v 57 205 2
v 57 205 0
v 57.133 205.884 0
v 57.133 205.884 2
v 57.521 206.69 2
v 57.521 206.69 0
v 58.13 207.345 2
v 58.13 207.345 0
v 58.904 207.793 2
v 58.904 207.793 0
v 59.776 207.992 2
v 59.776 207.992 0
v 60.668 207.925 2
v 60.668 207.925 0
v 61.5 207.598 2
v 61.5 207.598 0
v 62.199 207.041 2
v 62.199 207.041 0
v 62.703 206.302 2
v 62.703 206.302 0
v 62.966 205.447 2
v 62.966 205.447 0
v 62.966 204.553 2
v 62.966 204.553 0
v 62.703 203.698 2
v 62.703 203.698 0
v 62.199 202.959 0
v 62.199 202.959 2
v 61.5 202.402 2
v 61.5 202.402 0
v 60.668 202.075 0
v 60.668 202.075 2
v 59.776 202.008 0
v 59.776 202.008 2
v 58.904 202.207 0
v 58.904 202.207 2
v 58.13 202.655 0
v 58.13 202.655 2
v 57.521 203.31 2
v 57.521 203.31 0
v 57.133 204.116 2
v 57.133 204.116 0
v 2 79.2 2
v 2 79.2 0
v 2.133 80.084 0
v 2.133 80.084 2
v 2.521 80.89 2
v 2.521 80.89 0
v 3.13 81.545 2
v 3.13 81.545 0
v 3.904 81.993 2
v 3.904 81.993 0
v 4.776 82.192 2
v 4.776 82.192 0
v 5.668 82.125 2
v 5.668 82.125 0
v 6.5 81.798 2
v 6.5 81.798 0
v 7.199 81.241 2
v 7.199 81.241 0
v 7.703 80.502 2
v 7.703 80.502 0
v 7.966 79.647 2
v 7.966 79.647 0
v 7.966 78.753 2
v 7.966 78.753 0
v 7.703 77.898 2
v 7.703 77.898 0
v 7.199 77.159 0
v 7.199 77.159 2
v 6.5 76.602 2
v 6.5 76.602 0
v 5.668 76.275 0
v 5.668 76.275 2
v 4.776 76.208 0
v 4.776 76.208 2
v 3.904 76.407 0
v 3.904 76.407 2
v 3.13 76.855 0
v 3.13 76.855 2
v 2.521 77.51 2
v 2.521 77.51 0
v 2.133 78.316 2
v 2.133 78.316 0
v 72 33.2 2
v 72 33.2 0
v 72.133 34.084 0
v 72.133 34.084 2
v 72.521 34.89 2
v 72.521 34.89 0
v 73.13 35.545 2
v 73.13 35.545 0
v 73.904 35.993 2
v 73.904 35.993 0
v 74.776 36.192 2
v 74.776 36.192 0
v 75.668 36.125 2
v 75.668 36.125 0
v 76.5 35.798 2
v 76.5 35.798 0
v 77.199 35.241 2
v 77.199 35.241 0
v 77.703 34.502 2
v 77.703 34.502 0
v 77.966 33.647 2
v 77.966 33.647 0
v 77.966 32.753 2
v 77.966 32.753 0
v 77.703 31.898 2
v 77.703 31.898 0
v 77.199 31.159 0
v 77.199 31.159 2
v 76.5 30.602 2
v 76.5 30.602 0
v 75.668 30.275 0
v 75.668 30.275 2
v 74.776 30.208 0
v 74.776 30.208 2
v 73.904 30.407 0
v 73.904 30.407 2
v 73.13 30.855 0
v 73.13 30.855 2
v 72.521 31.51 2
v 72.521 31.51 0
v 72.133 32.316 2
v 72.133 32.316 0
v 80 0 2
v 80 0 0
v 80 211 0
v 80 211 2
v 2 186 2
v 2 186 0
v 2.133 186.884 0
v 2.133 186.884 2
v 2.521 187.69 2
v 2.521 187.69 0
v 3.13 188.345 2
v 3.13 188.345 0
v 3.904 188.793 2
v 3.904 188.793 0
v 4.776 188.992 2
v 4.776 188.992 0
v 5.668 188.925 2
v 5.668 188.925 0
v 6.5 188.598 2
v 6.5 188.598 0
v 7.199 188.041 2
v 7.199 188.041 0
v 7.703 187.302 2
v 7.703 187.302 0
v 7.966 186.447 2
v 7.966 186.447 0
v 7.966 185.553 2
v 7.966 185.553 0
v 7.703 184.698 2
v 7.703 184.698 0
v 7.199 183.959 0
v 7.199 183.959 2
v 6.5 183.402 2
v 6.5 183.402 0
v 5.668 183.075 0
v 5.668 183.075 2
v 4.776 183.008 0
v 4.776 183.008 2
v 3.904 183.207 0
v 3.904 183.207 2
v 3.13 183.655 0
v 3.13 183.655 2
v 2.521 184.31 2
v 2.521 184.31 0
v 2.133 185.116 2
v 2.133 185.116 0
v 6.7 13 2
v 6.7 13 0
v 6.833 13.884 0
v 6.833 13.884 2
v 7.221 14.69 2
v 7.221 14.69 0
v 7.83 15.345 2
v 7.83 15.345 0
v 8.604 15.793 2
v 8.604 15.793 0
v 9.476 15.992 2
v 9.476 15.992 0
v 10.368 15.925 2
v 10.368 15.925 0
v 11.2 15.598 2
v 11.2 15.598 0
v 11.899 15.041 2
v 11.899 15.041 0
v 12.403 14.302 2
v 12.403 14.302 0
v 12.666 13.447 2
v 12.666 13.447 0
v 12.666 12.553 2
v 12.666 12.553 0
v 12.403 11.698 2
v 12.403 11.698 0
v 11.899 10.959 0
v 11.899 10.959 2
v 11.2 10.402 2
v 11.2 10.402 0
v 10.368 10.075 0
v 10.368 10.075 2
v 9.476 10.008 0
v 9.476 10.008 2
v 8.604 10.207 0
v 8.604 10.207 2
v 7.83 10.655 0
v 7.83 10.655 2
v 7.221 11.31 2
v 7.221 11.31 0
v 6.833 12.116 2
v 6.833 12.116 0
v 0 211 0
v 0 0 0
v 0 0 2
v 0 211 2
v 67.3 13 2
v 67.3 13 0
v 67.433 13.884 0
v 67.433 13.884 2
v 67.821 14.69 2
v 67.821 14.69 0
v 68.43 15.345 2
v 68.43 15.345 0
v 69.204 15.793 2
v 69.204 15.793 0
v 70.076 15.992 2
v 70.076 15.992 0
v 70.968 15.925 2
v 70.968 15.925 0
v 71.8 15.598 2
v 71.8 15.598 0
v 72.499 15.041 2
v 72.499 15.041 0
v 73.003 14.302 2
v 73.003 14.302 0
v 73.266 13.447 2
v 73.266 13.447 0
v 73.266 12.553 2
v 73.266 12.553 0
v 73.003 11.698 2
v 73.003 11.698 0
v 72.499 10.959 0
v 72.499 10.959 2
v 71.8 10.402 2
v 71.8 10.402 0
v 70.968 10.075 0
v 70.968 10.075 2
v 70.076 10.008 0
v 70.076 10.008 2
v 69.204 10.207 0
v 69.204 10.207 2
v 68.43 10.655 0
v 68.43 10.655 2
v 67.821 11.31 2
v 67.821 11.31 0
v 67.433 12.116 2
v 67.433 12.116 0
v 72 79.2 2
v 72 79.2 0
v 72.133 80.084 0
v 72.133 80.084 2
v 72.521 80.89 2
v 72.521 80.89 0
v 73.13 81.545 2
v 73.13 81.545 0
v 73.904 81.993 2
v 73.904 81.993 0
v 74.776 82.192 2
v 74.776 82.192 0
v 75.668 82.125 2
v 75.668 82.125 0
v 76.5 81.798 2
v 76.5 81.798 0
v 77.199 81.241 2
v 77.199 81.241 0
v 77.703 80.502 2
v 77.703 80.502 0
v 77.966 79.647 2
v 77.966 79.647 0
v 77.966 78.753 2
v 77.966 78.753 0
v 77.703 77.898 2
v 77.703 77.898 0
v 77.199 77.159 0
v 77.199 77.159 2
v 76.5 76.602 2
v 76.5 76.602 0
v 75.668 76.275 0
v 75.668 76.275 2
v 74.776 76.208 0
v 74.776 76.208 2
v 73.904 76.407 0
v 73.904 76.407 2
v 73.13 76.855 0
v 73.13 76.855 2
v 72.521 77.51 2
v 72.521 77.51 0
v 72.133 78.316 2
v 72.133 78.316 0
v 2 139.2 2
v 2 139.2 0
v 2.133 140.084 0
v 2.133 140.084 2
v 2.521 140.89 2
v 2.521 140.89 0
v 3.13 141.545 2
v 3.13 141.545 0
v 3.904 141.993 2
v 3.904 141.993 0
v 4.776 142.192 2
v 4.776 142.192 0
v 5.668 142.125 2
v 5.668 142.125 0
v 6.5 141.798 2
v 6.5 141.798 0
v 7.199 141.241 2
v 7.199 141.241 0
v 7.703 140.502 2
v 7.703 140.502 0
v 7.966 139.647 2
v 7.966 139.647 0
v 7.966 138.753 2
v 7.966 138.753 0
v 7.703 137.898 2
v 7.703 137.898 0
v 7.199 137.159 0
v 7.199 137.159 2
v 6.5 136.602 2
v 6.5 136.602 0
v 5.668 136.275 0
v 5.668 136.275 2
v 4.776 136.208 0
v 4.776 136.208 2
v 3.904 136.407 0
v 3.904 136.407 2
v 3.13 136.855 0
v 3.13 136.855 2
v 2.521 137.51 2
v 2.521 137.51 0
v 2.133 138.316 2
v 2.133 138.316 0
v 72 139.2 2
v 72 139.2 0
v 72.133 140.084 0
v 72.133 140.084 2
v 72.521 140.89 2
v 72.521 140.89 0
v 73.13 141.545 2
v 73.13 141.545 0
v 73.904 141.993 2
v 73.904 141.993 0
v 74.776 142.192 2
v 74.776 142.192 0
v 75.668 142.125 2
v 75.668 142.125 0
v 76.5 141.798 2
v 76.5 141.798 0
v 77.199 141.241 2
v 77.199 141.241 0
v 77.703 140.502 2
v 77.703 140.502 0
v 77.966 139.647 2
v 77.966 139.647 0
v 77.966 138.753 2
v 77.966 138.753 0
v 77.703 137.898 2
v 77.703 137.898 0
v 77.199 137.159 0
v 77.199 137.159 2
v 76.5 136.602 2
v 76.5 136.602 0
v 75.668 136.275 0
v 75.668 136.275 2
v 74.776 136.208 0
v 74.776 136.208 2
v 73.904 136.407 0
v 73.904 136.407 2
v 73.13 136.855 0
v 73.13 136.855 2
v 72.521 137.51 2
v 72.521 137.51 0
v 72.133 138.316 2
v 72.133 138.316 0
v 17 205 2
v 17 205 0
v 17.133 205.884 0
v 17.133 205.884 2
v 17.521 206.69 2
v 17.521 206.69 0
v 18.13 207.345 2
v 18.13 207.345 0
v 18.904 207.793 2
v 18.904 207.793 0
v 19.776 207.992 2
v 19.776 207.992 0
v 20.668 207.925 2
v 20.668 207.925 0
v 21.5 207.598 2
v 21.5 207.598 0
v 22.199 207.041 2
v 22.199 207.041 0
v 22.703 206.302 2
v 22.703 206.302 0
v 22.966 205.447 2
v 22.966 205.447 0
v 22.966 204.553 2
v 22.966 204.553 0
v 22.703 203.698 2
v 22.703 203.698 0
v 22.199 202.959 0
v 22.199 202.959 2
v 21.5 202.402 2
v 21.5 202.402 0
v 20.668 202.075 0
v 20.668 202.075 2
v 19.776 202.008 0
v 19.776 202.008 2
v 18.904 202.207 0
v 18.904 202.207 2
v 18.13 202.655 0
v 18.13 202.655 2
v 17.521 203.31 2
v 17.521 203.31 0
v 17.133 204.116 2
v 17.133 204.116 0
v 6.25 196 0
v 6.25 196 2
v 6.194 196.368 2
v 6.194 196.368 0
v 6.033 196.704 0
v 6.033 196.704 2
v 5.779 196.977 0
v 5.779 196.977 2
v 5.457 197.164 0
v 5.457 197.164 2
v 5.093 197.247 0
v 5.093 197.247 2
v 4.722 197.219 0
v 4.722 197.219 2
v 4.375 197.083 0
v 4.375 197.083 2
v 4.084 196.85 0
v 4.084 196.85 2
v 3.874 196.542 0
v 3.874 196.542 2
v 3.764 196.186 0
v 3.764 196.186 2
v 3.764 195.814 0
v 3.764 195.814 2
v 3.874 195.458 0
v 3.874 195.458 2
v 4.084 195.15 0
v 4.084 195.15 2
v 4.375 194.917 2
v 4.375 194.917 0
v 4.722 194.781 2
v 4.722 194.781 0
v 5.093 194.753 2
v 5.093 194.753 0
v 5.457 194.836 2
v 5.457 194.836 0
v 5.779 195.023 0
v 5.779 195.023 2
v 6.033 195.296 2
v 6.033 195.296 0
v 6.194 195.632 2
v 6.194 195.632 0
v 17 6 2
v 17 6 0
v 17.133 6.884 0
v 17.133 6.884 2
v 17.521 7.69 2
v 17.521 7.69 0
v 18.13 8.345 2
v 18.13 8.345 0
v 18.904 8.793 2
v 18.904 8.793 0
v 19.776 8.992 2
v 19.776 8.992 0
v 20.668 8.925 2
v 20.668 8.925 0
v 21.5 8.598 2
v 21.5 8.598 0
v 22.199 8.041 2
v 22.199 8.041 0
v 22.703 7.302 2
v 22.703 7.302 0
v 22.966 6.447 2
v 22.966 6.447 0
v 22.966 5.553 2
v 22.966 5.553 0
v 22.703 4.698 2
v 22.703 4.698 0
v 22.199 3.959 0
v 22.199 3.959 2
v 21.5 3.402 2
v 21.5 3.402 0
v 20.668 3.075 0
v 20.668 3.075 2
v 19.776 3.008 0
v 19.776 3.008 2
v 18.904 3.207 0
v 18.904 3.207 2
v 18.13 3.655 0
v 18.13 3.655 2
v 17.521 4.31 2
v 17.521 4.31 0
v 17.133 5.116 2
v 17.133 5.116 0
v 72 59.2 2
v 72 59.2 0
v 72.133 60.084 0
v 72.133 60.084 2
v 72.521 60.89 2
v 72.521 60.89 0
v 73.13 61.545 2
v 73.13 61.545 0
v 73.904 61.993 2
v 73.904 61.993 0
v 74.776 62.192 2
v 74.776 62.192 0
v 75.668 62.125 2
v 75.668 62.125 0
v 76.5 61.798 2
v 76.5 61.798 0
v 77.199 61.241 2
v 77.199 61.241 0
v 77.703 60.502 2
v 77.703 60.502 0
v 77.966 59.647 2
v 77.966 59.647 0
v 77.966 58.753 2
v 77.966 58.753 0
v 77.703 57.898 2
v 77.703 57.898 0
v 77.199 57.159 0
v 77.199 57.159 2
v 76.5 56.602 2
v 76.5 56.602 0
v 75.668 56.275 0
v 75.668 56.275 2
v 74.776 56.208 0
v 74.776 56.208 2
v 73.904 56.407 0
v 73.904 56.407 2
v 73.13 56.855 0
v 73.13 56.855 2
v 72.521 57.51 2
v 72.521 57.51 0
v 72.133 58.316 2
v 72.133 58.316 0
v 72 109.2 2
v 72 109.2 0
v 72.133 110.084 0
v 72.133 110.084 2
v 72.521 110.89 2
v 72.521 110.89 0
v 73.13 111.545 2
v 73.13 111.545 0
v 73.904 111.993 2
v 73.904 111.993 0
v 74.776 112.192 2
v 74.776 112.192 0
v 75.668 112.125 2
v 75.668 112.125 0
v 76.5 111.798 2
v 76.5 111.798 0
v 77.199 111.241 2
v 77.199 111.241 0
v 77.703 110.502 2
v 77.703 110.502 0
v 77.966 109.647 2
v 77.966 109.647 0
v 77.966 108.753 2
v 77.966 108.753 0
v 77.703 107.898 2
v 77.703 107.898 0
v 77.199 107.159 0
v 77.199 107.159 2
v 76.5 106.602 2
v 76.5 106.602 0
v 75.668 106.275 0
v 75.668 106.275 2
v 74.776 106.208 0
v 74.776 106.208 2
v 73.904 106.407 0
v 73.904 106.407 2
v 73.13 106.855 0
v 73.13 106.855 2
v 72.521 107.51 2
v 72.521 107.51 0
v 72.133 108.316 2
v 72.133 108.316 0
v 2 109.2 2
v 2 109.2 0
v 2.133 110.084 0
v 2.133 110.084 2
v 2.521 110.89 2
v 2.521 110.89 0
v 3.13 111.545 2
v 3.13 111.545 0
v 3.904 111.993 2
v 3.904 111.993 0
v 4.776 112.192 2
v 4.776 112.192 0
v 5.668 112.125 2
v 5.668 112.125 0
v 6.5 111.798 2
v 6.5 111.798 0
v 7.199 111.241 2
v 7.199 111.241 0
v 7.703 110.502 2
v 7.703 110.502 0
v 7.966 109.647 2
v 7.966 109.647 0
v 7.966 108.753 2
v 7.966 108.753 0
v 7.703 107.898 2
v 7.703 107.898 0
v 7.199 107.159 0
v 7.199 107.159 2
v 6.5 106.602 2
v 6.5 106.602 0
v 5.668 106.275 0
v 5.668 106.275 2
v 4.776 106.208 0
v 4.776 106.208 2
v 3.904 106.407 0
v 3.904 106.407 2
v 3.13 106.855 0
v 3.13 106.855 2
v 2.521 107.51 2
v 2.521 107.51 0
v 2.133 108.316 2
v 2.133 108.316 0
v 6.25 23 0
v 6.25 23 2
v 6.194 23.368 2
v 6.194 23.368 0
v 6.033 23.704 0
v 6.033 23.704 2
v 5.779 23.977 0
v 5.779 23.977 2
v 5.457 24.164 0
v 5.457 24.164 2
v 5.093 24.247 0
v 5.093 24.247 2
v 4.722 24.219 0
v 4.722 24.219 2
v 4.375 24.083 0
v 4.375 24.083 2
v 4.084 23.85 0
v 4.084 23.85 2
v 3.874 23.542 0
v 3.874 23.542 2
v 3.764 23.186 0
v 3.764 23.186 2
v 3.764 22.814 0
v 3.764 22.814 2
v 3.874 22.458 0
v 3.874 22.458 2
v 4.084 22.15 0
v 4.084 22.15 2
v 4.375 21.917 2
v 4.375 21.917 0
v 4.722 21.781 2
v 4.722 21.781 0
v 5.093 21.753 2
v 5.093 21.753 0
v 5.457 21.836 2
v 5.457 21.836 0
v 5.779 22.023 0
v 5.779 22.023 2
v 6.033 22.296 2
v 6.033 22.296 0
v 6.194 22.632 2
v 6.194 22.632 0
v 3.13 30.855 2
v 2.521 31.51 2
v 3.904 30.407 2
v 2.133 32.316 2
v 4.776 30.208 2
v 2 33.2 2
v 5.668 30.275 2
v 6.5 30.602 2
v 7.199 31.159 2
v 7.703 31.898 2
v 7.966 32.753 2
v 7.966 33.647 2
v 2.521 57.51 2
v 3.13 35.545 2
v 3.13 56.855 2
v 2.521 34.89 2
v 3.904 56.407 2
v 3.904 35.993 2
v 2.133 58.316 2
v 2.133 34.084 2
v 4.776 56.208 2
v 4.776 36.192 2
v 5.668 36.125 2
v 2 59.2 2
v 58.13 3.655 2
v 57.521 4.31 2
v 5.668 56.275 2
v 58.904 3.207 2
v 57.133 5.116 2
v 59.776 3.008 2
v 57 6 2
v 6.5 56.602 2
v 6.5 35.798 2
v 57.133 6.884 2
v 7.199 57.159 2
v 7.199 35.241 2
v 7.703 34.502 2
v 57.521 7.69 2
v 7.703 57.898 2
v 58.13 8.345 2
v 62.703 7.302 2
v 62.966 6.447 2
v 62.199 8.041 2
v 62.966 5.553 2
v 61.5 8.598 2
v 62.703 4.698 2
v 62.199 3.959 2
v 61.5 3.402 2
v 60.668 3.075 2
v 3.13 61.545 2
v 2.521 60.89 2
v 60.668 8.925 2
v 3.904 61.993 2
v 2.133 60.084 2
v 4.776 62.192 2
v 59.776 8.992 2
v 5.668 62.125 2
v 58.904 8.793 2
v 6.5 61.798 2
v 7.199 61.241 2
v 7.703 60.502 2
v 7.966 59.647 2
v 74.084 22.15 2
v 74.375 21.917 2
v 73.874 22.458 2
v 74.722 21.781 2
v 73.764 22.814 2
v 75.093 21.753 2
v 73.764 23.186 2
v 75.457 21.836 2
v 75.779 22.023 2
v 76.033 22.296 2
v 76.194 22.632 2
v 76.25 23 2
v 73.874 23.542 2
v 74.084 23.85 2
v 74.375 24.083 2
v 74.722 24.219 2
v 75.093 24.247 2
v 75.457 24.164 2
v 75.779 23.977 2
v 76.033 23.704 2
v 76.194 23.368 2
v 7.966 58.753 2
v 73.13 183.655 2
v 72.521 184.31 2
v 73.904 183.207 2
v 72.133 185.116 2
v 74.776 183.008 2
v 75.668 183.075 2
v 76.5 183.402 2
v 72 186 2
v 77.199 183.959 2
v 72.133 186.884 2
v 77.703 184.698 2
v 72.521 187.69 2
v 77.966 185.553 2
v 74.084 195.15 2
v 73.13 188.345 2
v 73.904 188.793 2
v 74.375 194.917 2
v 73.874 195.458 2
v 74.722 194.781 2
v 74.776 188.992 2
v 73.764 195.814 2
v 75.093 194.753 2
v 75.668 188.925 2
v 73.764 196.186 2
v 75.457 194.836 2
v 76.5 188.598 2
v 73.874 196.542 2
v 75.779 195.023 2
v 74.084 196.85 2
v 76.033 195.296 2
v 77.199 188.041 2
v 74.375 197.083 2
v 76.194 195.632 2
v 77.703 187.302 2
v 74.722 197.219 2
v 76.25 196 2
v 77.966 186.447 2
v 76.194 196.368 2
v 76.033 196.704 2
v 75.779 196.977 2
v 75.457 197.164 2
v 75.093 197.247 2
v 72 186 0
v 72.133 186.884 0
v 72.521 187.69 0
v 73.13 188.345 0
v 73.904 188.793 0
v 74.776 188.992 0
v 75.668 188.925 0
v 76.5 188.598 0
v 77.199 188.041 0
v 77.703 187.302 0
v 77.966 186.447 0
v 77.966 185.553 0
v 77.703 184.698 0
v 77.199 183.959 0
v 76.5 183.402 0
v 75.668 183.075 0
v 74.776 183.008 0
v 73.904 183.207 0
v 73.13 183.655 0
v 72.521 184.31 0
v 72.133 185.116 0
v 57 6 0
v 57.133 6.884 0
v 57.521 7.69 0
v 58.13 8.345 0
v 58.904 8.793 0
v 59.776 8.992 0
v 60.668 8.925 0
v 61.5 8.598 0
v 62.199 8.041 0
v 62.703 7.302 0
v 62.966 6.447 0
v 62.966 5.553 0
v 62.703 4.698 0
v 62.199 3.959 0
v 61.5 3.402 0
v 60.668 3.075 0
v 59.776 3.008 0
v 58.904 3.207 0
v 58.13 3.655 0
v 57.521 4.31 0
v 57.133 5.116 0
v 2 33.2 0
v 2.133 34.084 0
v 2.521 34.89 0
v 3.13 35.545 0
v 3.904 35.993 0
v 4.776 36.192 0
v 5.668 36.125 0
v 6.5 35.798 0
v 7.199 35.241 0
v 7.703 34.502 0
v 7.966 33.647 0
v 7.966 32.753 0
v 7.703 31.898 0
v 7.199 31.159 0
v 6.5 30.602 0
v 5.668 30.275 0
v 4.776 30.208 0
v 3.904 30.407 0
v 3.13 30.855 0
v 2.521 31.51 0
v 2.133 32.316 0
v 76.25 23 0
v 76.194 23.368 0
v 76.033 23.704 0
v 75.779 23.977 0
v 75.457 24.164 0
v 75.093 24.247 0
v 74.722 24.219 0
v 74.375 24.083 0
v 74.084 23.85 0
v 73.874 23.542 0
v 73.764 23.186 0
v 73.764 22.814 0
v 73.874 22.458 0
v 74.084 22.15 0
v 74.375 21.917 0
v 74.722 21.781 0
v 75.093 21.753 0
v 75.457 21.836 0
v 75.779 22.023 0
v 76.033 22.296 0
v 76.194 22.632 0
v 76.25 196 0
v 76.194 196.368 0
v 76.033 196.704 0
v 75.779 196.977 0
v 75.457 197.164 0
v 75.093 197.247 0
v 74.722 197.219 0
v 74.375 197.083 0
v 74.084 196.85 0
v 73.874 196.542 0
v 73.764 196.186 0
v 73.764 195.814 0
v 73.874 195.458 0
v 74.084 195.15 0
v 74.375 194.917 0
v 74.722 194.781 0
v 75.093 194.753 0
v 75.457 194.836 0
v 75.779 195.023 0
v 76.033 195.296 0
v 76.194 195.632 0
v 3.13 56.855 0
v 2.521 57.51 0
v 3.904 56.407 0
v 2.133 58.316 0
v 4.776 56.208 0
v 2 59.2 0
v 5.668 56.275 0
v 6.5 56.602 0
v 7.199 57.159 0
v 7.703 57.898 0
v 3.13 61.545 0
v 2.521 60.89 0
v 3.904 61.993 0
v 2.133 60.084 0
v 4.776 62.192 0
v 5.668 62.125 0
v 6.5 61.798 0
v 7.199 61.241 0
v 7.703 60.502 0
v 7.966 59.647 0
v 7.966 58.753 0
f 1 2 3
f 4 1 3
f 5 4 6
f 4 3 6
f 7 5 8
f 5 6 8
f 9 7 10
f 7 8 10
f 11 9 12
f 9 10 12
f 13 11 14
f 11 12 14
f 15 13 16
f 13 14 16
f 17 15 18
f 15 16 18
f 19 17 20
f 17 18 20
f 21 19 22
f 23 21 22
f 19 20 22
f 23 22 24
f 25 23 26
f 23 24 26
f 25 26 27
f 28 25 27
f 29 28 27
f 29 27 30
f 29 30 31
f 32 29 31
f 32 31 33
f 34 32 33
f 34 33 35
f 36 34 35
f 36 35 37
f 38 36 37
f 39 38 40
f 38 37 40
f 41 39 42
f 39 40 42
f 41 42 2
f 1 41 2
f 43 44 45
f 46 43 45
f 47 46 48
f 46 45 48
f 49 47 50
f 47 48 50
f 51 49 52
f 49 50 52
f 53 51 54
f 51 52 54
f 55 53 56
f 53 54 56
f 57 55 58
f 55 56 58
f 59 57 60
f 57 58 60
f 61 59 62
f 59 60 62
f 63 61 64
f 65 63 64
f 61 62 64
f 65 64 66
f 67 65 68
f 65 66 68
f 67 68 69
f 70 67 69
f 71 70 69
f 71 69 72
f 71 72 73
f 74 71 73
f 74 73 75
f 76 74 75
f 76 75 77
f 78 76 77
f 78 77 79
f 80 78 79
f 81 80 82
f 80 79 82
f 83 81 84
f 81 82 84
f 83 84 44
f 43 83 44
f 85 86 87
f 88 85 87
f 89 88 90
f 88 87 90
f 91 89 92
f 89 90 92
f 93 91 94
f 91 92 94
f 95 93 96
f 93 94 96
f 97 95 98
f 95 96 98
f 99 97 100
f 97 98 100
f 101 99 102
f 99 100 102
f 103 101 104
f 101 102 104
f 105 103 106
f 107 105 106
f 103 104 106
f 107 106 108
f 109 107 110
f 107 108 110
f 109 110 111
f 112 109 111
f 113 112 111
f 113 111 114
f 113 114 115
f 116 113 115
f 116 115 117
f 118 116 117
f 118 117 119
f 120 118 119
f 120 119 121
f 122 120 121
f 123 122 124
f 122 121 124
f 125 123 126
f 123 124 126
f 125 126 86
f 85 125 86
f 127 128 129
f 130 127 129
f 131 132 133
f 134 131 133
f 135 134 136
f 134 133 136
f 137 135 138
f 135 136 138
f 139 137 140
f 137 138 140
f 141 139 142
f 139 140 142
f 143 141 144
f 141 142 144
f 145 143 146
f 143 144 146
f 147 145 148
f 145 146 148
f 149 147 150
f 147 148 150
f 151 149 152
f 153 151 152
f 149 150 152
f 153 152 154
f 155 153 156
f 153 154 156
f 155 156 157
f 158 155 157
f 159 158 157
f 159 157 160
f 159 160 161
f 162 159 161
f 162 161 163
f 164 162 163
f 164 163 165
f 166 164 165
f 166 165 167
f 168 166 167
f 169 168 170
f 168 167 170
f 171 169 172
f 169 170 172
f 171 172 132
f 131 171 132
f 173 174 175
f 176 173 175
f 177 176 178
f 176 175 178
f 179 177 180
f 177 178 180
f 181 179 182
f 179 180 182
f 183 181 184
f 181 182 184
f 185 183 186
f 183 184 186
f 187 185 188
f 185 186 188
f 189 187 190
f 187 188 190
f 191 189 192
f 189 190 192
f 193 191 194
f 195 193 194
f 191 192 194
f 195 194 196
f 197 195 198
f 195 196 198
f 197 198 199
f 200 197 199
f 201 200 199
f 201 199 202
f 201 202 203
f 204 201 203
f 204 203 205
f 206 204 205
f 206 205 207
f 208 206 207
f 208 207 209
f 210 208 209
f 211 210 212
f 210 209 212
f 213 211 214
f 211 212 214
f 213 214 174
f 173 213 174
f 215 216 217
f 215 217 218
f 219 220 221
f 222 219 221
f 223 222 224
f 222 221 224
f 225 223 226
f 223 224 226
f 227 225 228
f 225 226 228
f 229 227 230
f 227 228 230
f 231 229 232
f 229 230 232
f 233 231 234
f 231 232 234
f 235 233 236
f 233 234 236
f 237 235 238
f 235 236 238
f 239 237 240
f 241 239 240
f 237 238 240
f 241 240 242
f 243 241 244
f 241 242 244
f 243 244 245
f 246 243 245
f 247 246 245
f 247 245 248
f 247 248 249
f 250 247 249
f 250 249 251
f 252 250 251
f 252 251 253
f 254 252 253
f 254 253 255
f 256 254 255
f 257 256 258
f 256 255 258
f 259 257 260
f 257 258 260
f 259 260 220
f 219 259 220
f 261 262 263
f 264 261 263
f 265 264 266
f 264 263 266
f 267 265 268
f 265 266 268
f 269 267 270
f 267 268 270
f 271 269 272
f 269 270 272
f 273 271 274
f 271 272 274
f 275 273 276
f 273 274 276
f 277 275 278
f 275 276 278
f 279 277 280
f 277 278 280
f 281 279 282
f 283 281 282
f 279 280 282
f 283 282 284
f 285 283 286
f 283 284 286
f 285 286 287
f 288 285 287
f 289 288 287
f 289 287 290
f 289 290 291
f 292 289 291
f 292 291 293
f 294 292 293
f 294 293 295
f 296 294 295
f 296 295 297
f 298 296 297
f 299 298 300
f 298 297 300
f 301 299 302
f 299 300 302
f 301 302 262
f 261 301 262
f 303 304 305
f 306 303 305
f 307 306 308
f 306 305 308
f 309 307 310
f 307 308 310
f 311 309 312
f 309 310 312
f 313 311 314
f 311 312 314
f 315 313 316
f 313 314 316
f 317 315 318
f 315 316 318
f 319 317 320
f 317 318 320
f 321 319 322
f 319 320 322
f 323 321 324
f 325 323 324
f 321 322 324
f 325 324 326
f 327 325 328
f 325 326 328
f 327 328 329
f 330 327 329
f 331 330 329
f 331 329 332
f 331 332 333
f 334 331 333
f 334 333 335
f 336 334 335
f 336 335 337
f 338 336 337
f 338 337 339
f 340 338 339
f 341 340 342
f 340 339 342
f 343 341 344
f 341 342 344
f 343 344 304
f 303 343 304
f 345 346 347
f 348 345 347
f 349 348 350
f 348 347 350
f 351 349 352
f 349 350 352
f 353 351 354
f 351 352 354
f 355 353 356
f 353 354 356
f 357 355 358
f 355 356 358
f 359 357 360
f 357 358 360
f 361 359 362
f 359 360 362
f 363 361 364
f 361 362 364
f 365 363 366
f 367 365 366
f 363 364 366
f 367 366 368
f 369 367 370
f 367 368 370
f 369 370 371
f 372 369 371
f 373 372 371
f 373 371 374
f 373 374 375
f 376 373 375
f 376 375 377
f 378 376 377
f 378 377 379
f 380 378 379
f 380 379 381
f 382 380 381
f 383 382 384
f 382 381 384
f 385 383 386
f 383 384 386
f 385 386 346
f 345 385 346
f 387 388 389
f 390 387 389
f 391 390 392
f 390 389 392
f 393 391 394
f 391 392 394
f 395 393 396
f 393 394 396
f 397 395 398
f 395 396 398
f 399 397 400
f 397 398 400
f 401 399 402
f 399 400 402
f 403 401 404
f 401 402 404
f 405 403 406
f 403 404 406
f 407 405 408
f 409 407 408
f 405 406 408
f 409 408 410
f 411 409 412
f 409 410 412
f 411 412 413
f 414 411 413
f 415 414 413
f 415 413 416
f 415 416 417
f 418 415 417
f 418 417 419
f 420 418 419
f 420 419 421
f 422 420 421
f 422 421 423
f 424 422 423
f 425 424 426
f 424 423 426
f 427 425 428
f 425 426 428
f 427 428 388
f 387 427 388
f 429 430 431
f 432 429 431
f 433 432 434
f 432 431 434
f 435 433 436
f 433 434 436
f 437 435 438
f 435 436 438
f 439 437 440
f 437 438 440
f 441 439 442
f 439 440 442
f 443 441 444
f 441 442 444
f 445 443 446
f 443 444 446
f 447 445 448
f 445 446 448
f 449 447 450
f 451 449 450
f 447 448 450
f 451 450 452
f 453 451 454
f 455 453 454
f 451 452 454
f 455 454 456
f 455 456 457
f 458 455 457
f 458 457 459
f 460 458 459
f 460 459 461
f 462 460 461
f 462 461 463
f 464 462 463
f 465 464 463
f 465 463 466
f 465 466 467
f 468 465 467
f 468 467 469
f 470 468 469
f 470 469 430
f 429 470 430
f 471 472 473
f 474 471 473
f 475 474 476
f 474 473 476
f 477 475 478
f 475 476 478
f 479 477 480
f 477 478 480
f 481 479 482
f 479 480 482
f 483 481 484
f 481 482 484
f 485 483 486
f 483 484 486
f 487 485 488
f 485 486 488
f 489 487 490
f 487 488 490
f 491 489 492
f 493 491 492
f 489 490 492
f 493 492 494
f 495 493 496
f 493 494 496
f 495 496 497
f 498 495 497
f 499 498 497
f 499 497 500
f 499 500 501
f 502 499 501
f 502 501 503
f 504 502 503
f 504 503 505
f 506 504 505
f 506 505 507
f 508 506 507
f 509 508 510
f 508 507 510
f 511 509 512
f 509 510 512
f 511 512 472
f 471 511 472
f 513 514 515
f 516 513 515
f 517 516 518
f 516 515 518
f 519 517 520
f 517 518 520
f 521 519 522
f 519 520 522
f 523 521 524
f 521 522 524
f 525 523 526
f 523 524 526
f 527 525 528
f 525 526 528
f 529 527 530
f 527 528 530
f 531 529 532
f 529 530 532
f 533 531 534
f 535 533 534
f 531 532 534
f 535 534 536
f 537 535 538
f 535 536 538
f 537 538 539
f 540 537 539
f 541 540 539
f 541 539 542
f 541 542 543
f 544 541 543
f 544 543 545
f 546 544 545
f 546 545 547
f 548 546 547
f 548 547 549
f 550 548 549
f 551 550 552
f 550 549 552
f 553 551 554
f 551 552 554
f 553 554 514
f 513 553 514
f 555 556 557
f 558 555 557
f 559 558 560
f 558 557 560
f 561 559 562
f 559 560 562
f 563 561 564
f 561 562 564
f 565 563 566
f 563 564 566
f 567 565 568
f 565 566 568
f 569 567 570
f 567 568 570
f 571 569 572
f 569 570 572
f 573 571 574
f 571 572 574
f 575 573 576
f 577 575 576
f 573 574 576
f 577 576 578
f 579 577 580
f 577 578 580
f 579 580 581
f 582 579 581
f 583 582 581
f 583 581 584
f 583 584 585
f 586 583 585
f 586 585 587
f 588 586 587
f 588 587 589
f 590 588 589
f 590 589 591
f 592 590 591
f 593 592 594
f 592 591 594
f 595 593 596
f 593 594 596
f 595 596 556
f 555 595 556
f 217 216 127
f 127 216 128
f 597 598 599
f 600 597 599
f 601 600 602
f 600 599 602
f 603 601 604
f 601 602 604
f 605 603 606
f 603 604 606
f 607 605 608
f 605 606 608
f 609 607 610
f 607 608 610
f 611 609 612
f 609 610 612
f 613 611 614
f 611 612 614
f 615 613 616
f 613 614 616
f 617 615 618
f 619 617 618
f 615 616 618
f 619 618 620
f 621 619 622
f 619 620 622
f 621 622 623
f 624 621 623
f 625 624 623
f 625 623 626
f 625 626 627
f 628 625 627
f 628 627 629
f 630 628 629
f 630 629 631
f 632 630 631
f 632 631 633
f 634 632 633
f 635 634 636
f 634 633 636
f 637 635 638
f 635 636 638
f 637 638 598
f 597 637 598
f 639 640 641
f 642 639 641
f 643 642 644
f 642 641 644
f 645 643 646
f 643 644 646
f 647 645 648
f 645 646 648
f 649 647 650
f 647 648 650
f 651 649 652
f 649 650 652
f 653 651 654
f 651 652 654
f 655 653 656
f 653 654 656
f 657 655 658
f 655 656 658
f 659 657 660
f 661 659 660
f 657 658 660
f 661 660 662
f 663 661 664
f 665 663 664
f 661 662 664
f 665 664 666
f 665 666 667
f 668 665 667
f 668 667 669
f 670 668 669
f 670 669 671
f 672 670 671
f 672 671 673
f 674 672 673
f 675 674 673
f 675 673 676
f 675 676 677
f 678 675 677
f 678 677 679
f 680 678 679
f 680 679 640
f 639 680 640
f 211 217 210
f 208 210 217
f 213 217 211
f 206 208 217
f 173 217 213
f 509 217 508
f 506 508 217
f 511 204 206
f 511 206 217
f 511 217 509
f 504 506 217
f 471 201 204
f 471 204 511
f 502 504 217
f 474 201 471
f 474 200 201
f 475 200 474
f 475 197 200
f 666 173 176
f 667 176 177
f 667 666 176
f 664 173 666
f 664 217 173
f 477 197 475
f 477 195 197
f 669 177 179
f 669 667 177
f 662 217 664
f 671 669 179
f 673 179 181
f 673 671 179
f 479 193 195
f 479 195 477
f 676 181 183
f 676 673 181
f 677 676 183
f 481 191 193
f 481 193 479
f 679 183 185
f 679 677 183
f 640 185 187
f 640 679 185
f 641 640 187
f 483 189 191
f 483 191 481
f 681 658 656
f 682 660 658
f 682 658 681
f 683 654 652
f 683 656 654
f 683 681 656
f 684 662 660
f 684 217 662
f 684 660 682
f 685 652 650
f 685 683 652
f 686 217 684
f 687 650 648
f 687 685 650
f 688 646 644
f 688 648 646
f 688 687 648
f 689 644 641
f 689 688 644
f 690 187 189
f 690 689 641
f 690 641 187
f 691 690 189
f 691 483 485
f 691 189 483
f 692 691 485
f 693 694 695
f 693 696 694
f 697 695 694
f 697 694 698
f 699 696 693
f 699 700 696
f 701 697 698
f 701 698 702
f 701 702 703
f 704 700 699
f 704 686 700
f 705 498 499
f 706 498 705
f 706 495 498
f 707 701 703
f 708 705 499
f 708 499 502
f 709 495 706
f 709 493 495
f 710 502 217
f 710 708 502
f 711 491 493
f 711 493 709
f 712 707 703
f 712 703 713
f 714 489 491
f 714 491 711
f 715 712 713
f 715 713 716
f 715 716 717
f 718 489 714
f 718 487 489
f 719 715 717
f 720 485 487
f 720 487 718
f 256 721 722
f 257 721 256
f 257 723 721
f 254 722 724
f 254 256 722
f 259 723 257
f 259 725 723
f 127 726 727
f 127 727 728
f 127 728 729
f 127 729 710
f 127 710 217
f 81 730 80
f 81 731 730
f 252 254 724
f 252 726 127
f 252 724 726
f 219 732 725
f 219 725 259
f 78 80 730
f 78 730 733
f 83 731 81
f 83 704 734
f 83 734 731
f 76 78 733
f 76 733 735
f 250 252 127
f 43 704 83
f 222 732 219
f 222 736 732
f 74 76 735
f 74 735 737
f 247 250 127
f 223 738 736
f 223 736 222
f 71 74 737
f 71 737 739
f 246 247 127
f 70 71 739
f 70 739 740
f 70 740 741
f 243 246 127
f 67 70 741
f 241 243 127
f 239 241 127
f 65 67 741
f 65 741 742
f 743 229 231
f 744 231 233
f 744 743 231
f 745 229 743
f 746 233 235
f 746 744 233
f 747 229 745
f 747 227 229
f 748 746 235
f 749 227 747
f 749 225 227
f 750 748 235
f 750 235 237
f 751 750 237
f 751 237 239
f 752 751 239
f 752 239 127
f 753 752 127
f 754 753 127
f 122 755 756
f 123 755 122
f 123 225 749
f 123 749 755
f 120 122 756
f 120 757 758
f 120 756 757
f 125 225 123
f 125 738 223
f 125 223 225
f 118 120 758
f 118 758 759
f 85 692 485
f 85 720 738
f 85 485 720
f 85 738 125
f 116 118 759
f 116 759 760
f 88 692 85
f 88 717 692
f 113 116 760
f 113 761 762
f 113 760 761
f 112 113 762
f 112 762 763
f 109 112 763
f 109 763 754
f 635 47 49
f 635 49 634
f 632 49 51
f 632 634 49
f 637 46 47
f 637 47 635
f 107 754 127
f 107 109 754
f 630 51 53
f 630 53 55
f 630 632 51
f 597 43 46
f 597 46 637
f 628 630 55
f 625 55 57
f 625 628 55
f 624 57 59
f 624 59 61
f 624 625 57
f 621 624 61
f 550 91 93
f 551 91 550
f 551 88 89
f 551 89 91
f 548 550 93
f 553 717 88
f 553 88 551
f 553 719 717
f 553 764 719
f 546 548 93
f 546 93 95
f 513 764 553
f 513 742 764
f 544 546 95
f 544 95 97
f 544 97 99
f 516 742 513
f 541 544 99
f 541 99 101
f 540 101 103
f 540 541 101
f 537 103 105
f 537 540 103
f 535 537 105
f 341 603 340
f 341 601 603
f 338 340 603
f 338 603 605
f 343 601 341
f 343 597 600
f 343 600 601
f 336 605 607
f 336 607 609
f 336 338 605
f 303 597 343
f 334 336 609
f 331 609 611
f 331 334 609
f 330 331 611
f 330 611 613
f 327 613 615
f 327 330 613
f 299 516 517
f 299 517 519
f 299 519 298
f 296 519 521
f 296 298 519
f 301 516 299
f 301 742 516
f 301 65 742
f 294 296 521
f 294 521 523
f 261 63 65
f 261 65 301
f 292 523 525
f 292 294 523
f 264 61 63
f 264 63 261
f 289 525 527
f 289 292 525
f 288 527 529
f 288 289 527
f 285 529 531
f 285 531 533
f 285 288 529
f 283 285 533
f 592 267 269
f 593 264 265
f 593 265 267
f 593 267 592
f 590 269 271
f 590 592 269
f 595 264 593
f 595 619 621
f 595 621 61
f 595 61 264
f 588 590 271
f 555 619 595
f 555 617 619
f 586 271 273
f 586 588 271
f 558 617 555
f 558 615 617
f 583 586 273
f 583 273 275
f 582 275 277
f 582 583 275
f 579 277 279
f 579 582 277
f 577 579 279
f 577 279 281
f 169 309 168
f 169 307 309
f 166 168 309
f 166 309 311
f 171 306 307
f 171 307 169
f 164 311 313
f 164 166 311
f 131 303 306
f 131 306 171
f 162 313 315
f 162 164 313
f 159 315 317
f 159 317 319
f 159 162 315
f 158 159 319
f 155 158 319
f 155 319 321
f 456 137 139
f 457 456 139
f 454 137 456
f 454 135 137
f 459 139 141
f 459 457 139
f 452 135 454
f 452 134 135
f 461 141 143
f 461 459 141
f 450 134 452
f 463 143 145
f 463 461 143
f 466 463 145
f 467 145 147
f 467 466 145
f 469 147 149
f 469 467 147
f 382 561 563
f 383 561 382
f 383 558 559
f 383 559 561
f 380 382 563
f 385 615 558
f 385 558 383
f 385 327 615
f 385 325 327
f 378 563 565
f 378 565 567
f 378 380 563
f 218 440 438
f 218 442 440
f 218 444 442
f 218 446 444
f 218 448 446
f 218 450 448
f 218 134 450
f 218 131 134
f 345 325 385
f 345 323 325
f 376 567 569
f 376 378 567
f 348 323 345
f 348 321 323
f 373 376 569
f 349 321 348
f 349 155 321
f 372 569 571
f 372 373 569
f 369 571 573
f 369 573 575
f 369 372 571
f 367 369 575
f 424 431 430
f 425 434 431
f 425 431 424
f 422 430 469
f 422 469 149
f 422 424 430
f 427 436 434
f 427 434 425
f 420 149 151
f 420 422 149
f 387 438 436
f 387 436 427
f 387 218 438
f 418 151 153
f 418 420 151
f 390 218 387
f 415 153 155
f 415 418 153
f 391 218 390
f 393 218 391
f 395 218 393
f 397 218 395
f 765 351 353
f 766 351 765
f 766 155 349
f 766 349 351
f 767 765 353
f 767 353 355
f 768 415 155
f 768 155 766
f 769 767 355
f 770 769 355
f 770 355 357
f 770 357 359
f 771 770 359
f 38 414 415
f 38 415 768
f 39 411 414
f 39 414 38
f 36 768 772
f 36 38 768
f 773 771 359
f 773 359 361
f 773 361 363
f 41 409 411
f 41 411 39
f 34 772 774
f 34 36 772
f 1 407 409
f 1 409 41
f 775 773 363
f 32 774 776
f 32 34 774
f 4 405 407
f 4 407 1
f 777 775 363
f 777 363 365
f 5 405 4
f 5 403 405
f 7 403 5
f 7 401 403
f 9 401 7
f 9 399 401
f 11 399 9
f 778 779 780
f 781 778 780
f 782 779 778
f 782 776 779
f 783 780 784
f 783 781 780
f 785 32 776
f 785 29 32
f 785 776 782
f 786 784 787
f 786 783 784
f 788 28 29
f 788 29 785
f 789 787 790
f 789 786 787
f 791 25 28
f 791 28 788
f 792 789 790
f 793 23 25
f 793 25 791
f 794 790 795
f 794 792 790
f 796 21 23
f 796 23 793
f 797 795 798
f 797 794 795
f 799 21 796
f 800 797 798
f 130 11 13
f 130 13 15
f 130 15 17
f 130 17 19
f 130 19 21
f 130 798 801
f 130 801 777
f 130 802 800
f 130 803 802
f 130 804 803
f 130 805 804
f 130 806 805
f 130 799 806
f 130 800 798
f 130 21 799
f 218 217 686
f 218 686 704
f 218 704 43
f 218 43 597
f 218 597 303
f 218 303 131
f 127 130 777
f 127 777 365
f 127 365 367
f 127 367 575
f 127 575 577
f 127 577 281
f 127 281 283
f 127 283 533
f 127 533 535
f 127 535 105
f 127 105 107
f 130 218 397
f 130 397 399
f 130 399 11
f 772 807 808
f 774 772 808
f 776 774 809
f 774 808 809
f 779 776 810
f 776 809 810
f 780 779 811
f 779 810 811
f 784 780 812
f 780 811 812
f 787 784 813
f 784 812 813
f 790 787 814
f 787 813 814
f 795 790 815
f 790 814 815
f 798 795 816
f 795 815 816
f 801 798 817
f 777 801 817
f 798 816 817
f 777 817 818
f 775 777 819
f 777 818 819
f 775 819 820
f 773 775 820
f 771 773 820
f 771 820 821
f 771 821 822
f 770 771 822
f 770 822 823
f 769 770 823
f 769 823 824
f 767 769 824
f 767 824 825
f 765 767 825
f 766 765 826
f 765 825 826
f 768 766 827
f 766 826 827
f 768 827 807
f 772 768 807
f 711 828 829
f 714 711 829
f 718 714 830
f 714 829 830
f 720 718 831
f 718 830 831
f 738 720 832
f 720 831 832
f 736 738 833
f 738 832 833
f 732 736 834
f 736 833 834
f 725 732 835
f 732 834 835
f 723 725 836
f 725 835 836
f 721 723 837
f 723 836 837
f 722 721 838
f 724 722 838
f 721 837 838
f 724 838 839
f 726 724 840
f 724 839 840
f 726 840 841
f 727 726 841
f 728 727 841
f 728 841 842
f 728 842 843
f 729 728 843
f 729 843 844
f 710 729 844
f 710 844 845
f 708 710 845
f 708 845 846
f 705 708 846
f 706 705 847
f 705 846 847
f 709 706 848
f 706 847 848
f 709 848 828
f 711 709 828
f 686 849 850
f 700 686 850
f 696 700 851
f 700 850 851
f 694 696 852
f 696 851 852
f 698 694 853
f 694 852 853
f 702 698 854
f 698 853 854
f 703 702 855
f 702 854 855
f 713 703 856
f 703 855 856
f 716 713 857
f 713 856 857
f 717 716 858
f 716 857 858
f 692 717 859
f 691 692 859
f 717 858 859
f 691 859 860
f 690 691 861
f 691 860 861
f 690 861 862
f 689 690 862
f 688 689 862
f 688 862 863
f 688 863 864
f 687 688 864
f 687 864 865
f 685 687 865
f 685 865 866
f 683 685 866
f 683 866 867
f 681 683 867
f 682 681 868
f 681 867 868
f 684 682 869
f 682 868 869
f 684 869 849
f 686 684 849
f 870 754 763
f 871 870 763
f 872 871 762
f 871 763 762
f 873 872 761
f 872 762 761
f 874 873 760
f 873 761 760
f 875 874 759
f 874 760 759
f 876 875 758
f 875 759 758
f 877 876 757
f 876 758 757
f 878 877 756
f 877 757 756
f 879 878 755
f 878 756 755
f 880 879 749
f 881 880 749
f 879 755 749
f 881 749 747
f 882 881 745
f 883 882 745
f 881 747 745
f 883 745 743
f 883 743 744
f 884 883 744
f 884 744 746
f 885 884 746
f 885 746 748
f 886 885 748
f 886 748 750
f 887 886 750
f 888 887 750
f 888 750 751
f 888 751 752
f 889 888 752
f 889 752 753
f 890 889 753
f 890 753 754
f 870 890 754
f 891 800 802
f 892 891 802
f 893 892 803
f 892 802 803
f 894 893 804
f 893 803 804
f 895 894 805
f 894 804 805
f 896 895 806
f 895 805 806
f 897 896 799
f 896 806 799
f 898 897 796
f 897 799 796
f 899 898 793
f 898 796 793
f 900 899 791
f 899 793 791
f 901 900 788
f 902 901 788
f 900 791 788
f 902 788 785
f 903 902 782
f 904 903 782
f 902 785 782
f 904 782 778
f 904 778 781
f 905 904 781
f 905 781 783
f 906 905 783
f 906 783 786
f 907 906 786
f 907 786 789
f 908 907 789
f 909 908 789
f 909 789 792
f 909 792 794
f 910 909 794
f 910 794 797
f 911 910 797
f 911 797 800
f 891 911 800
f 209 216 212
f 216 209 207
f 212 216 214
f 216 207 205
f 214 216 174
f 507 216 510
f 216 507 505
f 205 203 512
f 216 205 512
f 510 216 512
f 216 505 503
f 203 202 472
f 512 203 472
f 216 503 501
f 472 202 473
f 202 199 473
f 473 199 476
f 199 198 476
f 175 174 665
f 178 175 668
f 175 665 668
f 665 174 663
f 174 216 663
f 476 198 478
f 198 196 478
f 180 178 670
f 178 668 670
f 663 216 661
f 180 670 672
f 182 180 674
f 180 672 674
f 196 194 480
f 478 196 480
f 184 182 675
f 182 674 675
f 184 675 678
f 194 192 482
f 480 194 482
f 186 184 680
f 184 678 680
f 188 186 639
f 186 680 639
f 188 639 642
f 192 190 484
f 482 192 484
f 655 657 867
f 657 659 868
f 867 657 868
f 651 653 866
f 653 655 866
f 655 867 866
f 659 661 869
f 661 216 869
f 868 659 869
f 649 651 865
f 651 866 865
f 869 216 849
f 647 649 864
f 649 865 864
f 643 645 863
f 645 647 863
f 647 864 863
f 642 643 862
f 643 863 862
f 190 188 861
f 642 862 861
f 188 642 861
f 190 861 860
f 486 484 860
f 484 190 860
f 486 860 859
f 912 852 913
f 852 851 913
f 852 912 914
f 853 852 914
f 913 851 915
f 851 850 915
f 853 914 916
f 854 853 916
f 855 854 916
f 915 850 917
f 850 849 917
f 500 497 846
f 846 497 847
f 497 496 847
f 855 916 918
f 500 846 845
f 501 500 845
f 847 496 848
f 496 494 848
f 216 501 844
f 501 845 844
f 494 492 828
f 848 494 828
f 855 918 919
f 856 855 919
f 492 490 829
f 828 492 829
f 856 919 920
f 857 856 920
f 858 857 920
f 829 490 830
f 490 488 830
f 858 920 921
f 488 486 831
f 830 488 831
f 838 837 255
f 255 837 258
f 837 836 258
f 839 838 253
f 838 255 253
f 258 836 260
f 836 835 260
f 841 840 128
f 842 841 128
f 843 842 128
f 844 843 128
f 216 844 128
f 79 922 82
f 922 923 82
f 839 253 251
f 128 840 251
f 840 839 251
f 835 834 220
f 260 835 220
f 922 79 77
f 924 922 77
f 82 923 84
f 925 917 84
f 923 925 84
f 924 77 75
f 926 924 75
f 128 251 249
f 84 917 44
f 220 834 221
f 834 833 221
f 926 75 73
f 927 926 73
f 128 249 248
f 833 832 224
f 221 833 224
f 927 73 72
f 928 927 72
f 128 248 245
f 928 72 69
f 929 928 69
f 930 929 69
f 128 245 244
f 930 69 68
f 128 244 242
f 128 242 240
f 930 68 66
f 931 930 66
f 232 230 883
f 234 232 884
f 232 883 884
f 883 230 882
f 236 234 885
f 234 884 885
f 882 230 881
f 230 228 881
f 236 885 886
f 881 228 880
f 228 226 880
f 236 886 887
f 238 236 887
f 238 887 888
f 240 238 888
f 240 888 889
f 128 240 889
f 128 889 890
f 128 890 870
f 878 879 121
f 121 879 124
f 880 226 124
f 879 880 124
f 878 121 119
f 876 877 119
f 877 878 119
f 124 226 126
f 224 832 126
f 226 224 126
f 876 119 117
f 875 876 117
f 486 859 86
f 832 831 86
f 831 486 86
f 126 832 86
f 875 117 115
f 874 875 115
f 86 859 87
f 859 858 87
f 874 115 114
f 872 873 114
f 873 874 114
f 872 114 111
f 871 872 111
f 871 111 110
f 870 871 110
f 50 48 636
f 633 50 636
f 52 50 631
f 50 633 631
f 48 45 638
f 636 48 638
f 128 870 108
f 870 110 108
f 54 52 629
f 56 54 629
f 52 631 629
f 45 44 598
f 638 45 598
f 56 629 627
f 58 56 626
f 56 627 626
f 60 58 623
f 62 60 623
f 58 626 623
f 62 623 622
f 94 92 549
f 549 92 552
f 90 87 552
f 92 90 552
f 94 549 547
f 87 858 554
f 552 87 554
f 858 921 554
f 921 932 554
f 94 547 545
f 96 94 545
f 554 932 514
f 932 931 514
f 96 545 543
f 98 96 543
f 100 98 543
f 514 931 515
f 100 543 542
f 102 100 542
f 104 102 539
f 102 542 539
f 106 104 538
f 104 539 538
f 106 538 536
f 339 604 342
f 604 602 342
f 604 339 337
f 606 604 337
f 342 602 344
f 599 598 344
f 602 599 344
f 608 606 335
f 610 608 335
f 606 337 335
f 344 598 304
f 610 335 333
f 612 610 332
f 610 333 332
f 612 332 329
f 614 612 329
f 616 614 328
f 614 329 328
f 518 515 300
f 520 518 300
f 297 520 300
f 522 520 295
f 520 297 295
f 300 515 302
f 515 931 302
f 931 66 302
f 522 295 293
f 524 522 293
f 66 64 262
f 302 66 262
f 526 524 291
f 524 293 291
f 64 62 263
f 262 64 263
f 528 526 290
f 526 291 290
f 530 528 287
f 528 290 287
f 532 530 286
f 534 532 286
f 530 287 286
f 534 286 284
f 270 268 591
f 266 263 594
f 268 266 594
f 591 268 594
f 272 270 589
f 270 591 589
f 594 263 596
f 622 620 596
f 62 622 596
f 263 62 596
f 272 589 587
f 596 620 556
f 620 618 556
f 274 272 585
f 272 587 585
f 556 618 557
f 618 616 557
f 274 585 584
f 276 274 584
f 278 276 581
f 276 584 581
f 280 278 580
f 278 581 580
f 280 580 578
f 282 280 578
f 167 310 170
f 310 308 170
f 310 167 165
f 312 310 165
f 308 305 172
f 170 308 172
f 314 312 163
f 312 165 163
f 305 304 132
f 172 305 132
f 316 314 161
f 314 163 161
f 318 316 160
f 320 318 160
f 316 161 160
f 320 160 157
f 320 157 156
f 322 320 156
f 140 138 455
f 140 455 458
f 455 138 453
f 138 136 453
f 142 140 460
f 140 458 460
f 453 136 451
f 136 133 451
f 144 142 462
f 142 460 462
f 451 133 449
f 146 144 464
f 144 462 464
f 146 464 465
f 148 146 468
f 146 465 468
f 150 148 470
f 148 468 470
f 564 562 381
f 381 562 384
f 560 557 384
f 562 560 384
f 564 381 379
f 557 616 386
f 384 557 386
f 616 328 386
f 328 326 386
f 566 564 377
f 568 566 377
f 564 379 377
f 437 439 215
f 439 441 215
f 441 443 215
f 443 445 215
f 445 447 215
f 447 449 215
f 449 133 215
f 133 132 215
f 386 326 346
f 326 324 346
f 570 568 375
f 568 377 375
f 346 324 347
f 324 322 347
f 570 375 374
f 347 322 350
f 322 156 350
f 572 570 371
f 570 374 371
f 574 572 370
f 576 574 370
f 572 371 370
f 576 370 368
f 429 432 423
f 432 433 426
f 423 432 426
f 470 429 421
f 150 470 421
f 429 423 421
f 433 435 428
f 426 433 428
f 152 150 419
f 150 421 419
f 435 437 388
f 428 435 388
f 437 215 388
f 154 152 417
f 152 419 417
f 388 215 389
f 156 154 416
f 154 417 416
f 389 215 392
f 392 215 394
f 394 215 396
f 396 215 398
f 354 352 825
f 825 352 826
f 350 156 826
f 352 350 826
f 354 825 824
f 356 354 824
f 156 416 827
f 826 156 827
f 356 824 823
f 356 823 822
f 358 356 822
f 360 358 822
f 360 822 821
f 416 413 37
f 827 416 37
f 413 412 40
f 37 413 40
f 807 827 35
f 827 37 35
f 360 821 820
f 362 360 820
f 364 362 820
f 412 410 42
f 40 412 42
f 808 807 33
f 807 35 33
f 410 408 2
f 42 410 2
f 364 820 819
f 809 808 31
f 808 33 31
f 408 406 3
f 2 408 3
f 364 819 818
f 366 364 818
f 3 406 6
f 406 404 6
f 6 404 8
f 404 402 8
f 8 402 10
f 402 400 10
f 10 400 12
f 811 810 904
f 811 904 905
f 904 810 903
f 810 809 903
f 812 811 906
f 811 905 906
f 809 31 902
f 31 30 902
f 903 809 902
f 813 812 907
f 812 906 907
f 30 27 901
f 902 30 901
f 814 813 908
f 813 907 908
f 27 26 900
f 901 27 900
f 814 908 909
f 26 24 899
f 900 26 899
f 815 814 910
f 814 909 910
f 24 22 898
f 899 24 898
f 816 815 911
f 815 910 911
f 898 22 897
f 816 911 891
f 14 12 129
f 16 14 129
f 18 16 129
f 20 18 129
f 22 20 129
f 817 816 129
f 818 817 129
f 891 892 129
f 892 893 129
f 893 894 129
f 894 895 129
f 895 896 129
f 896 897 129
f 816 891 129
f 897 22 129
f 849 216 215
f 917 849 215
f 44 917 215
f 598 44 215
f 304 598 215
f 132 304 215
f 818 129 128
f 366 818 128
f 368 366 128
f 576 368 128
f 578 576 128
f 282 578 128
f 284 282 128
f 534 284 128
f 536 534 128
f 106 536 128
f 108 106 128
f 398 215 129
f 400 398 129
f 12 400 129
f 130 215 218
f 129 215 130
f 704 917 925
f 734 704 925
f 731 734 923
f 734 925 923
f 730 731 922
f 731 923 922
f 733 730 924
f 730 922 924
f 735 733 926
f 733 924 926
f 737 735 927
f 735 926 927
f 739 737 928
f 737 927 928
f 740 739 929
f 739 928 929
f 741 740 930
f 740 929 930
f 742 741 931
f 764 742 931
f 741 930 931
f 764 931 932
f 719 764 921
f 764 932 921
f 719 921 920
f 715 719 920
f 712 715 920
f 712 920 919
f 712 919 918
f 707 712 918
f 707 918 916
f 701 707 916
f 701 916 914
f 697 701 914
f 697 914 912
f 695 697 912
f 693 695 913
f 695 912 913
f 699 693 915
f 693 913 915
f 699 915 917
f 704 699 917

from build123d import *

# Parameters (mm, degrees)
SKETCH2_W                 = 80
SKETCH2_H                 = 211
BOSS_EXTRUDE1_DEPTH       = 2
M3X0_5_TAPPED_HOLE1_D     = 2.5
M3X0_5_TAPPED_HOLE1_DEPTH = 10
M3X0_5_TAPPED_HOLE1_TIP   = 0.751075774
SKETCH7_R                 = 3
CUT_EXTRUDE1_DEPTH        = 2


with BuildPart() as part:
    # Sketch2 → Boss-Extrude1 (new body)
    with BuildSketch(Plane.XY):
        with Locations((40, 105.5)):
            Rectangle(SKETCH2_W, SKETCH2_H)
    extrude(amount=BOSS_EXTRUDE1_DEPTH)

    # M3x0.5 Tapped Hole1
    with Locations(Plane(origin=(0, 0, 0), x_dir=(-1, 0, 0), z_dir=(0, 0, -1))):
        with Locations((-75, 196), (-5, 196), (-75, 23), (-5, 23)):
            Hole(M3X0_5_TAPPED_HOLE1_D / 2, depth=M3X0_5_TAPPED_HOLE1_DEPTH)
            with Locations((0, 0, -(M3X0_5_TAPPED_HOLE1_DEPTH + M3X0_5_TAPPED_HOLE1_TIP / 2))):  # 118° drill point
                Cone(0, M3X0_5_TAPPED_HOLE1_D / 2, M3X0_5_TAPPED_HOLE1_TIP, mode=Mode.SUBTRACT)

    # Sketch7 → Cut-Extrude1 (cut)
    with BuildSketch(Plane(origin=(0, 0, 0), x_dir=(-1, 0, 0), z_dir=(0, 0, -1))):
        with Locations((-75, 186)):
            Circle(SKETCH7_R)
        with Locations((-75, 139.2)):
            Circle(SKETCH7_R)
        with Locations((-75, 109.2)):
            Circle(SKETCH7_R)
        with Locations((-75, 79.2)):
            Circle(SKETCH7_R)
        with Locations((-75, 59.2)):
            Circle(SKETCH7_R)
        with Locations((-75, 33.2)):
            Circle(SKETCH7_R)
        with Locations((-5, 186)):
            Circle(SKETCH7_R)
        with Locations((-5, 139.2)):
            Circle(SKETCH7_R)
        with Locations((-5, 109.2)):
            Circle(SKETCH7_R)
        with Locations((-5, 79.2)):
            Circle(SKETCH7_R)
        with Locations((-5, 59.2)):
            Circle(SKETCH7_R)
        with Locations((-5, 33.2)):
            Circle(SKETCH7_R)
        with Locations((-70.3, 13)):
            Circle(SKETCH7_R)
        with Locations((-60, 205)):
            Circle(SKETCH7_R)
        with Locations((-20, 205)):
            Circle(SKETCH7_R)
        with Locations((-60, 6)):
            Circle(SKETCH7_R)
        with Locations((-20, 6)):
            Circle(SKETCH7_R)
        with Locations((-9.7, 13)):
            Circle(SKETCH7_R)
    extrude(amount=-CUT_EXTRUDE1_DEPTH, mode=Mode.SUBTRACT)


solid = part.part
